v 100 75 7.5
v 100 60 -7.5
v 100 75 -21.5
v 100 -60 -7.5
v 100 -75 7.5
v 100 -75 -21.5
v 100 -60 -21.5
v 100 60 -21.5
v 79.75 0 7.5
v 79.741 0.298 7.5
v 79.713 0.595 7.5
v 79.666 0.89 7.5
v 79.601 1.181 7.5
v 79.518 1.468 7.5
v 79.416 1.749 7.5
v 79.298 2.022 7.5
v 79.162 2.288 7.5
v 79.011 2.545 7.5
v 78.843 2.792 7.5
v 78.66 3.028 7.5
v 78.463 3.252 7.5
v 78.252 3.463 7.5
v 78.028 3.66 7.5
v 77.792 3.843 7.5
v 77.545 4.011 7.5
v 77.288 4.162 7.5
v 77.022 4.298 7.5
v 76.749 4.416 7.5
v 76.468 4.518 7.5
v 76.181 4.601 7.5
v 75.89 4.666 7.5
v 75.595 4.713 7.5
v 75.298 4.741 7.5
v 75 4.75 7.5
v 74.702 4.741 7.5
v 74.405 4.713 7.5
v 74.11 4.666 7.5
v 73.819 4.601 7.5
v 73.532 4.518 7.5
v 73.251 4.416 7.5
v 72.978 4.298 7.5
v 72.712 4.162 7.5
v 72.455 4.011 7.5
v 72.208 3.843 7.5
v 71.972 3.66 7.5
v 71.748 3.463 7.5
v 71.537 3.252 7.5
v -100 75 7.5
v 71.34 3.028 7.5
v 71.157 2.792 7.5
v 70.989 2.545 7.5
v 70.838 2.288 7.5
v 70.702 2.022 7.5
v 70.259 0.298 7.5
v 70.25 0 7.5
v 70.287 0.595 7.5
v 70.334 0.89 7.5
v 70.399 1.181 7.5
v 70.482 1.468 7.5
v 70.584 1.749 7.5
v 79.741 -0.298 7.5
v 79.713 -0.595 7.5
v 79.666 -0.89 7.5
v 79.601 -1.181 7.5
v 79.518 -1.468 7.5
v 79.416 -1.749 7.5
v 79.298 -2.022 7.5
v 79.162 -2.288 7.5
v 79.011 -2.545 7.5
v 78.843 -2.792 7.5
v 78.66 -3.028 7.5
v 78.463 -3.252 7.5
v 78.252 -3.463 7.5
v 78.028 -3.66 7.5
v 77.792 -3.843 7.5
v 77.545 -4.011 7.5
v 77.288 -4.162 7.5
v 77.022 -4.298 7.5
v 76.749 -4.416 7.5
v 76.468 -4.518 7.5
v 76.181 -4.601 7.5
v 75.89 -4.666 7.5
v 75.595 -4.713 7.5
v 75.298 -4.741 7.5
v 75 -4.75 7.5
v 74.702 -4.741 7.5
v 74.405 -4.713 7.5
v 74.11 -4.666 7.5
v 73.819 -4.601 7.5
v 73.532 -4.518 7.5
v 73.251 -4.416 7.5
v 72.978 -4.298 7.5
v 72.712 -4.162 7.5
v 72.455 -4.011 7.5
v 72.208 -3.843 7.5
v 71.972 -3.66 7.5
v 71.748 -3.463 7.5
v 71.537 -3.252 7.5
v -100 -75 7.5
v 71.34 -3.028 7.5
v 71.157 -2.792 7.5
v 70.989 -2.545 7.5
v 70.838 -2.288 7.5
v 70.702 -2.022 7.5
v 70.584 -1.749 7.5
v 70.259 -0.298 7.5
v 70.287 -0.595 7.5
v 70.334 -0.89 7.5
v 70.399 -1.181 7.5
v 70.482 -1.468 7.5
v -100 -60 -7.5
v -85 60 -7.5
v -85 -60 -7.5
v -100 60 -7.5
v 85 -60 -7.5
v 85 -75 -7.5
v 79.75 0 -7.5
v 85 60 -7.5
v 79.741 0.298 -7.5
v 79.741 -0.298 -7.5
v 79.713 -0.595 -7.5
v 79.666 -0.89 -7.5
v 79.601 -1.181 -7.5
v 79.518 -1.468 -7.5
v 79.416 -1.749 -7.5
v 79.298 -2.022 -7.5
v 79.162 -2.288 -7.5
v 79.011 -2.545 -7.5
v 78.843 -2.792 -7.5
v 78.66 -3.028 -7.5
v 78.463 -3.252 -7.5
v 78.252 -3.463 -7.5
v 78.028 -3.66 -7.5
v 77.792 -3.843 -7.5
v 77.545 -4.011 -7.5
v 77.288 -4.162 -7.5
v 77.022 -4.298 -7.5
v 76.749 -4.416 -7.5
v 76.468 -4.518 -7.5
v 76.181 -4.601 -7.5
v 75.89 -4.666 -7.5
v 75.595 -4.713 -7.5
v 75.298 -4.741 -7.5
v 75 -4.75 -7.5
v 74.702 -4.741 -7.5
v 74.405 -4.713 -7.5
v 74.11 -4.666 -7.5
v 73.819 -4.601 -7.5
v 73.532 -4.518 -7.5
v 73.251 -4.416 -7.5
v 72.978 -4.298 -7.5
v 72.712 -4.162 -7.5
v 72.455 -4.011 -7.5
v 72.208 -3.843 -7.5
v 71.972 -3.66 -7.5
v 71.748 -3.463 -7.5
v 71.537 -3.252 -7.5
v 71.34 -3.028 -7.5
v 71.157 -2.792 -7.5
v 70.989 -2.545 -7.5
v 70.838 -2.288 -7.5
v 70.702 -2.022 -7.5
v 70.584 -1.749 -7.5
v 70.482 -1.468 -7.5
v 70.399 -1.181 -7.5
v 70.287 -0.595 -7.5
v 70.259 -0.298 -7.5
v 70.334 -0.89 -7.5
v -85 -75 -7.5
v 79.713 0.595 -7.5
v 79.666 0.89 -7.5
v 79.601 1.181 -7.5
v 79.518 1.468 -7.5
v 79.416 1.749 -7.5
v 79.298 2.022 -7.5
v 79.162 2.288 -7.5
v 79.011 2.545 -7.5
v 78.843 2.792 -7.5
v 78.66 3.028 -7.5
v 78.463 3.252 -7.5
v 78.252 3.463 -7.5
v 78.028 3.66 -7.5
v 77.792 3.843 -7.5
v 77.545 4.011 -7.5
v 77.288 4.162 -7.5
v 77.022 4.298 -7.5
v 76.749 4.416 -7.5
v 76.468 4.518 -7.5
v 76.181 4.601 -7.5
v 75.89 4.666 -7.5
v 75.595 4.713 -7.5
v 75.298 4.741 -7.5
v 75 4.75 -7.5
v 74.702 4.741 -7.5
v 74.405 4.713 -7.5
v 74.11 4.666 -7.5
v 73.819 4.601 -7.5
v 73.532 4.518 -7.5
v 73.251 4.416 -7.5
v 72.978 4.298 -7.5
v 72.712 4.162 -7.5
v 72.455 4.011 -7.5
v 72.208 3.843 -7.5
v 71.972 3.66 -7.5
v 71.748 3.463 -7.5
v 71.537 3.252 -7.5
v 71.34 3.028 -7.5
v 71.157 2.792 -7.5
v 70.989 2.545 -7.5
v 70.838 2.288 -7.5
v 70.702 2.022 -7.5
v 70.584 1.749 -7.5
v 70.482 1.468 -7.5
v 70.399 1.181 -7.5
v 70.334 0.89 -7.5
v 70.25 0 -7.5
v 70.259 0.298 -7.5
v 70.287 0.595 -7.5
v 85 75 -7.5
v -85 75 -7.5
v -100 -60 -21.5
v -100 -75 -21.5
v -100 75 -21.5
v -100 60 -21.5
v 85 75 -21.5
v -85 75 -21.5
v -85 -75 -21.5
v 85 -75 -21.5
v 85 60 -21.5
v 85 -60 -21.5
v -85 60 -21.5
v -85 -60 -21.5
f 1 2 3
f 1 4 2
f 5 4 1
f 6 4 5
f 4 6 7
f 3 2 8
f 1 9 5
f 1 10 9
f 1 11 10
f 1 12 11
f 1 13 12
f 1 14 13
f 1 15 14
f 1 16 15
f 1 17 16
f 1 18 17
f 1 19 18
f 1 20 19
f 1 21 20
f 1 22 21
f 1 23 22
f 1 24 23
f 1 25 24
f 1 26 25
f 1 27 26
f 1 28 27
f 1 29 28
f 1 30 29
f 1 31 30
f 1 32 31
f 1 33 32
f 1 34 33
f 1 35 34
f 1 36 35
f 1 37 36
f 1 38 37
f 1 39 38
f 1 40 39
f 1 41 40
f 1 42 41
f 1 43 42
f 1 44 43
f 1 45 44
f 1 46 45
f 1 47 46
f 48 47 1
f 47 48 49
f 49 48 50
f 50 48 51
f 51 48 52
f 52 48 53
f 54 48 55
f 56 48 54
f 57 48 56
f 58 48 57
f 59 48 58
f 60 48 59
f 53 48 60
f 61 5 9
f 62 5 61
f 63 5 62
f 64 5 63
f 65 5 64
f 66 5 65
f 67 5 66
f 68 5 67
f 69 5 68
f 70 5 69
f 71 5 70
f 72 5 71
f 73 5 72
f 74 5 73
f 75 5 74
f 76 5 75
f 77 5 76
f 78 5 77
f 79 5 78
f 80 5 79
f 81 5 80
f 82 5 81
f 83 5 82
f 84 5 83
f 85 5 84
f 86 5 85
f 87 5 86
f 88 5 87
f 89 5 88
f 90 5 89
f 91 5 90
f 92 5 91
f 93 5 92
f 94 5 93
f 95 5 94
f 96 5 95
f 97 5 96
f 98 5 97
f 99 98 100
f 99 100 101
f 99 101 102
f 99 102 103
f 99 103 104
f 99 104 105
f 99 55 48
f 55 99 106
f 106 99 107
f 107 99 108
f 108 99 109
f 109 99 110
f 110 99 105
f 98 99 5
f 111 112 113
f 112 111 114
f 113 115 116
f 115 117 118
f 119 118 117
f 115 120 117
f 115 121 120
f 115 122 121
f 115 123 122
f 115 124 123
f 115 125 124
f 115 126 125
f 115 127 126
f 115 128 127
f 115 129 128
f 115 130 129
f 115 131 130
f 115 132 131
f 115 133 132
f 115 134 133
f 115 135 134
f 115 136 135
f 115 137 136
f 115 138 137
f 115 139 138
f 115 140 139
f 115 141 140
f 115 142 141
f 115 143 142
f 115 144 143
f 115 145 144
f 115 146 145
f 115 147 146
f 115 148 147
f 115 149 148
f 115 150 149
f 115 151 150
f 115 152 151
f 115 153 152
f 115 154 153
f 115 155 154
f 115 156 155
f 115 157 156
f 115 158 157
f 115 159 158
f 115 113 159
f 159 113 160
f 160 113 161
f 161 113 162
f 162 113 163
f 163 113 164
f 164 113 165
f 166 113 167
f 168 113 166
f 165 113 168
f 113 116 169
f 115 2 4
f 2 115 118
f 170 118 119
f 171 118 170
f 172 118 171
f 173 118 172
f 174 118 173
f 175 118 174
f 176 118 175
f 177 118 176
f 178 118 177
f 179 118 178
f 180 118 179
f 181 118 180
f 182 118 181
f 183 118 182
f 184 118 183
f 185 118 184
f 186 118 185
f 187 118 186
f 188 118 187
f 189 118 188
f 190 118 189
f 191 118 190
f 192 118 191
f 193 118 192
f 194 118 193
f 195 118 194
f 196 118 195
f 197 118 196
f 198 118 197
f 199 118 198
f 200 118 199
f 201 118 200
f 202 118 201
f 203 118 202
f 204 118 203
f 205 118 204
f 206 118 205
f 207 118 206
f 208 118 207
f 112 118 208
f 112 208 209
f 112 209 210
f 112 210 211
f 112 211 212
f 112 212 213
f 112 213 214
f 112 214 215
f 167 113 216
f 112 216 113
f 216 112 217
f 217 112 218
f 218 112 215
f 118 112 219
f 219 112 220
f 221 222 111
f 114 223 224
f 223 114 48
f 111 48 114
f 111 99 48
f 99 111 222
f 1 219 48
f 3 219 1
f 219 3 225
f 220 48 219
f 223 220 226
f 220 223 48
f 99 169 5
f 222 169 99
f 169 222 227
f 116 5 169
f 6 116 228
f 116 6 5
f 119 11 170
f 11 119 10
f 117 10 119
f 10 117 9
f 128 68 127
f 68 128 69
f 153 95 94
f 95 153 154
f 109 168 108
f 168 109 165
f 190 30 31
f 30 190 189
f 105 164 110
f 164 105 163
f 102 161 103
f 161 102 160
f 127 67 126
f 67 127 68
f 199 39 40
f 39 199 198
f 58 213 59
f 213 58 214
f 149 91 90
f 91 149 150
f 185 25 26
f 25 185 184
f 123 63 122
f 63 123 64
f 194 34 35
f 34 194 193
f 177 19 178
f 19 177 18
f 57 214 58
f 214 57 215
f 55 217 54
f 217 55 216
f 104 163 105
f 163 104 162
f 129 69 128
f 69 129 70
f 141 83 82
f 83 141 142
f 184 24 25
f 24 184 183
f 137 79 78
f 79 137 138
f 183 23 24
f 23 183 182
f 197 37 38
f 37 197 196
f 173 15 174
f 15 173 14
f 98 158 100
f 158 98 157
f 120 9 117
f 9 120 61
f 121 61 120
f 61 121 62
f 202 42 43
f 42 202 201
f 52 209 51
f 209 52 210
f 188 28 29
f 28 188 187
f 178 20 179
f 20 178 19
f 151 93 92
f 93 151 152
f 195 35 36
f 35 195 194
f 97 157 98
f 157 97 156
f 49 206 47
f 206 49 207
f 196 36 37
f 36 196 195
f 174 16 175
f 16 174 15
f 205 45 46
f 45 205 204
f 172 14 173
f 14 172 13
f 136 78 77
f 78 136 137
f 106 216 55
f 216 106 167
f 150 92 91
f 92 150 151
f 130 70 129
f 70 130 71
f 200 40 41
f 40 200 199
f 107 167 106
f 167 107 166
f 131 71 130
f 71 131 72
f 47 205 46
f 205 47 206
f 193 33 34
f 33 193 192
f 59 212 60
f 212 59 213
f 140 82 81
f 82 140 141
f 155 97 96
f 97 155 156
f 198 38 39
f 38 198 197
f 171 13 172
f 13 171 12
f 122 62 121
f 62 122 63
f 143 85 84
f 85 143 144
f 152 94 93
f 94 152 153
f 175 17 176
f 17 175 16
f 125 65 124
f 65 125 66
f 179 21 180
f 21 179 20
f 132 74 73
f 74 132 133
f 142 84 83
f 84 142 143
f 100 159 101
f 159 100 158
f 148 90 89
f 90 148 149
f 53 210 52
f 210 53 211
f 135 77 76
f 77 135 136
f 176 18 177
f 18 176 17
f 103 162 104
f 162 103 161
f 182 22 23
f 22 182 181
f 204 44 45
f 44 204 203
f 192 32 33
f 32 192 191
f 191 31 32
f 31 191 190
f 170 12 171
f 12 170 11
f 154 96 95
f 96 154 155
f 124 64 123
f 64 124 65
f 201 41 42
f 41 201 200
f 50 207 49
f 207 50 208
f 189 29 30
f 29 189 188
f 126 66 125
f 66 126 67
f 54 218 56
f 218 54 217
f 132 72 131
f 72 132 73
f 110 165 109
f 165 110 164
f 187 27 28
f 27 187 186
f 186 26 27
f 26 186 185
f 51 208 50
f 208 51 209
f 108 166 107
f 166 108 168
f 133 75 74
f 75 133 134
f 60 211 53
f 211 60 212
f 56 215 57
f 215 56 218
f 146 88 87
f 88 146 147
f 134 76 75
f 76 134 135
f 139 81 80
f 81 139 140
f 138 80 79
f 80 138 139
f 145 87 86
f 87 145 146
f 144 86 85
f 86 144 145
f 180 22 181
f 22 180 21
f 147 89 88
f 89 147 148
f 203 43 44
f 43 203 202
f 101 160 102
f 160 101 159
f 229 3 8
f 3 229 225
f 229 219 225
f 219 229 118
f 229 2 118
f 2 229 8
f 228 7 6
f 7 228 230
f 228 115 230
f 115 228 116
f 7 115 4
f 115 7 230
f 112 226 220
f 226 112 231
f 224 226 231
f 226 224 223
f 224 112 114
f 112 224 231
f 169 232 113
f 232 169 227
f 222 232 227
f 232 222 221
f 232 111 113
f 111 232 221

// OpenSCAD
l=200;
w=150;
h=15;
r=4.75;
x=15;
y=15;

$fn=100;

union(){
union(){
union(){
union(){
difference(){
cube(size=[l,w,h],center=true);
translate([75,0,0])cylinder(h+1,r,r,center=true);
}
translate([92.5,67.5,-14])cube(size=[x,y,h],center=true);
translate([92.5,-67.5,-14])cube(size=[x,y,h],center=true);
translate([-92.5,67.5,-14])cube(size=[x,y,h],center=true);
translate([-92.5,-67.5,-14])cube(size=[x,y,h],center=true);
}
}
}
}
